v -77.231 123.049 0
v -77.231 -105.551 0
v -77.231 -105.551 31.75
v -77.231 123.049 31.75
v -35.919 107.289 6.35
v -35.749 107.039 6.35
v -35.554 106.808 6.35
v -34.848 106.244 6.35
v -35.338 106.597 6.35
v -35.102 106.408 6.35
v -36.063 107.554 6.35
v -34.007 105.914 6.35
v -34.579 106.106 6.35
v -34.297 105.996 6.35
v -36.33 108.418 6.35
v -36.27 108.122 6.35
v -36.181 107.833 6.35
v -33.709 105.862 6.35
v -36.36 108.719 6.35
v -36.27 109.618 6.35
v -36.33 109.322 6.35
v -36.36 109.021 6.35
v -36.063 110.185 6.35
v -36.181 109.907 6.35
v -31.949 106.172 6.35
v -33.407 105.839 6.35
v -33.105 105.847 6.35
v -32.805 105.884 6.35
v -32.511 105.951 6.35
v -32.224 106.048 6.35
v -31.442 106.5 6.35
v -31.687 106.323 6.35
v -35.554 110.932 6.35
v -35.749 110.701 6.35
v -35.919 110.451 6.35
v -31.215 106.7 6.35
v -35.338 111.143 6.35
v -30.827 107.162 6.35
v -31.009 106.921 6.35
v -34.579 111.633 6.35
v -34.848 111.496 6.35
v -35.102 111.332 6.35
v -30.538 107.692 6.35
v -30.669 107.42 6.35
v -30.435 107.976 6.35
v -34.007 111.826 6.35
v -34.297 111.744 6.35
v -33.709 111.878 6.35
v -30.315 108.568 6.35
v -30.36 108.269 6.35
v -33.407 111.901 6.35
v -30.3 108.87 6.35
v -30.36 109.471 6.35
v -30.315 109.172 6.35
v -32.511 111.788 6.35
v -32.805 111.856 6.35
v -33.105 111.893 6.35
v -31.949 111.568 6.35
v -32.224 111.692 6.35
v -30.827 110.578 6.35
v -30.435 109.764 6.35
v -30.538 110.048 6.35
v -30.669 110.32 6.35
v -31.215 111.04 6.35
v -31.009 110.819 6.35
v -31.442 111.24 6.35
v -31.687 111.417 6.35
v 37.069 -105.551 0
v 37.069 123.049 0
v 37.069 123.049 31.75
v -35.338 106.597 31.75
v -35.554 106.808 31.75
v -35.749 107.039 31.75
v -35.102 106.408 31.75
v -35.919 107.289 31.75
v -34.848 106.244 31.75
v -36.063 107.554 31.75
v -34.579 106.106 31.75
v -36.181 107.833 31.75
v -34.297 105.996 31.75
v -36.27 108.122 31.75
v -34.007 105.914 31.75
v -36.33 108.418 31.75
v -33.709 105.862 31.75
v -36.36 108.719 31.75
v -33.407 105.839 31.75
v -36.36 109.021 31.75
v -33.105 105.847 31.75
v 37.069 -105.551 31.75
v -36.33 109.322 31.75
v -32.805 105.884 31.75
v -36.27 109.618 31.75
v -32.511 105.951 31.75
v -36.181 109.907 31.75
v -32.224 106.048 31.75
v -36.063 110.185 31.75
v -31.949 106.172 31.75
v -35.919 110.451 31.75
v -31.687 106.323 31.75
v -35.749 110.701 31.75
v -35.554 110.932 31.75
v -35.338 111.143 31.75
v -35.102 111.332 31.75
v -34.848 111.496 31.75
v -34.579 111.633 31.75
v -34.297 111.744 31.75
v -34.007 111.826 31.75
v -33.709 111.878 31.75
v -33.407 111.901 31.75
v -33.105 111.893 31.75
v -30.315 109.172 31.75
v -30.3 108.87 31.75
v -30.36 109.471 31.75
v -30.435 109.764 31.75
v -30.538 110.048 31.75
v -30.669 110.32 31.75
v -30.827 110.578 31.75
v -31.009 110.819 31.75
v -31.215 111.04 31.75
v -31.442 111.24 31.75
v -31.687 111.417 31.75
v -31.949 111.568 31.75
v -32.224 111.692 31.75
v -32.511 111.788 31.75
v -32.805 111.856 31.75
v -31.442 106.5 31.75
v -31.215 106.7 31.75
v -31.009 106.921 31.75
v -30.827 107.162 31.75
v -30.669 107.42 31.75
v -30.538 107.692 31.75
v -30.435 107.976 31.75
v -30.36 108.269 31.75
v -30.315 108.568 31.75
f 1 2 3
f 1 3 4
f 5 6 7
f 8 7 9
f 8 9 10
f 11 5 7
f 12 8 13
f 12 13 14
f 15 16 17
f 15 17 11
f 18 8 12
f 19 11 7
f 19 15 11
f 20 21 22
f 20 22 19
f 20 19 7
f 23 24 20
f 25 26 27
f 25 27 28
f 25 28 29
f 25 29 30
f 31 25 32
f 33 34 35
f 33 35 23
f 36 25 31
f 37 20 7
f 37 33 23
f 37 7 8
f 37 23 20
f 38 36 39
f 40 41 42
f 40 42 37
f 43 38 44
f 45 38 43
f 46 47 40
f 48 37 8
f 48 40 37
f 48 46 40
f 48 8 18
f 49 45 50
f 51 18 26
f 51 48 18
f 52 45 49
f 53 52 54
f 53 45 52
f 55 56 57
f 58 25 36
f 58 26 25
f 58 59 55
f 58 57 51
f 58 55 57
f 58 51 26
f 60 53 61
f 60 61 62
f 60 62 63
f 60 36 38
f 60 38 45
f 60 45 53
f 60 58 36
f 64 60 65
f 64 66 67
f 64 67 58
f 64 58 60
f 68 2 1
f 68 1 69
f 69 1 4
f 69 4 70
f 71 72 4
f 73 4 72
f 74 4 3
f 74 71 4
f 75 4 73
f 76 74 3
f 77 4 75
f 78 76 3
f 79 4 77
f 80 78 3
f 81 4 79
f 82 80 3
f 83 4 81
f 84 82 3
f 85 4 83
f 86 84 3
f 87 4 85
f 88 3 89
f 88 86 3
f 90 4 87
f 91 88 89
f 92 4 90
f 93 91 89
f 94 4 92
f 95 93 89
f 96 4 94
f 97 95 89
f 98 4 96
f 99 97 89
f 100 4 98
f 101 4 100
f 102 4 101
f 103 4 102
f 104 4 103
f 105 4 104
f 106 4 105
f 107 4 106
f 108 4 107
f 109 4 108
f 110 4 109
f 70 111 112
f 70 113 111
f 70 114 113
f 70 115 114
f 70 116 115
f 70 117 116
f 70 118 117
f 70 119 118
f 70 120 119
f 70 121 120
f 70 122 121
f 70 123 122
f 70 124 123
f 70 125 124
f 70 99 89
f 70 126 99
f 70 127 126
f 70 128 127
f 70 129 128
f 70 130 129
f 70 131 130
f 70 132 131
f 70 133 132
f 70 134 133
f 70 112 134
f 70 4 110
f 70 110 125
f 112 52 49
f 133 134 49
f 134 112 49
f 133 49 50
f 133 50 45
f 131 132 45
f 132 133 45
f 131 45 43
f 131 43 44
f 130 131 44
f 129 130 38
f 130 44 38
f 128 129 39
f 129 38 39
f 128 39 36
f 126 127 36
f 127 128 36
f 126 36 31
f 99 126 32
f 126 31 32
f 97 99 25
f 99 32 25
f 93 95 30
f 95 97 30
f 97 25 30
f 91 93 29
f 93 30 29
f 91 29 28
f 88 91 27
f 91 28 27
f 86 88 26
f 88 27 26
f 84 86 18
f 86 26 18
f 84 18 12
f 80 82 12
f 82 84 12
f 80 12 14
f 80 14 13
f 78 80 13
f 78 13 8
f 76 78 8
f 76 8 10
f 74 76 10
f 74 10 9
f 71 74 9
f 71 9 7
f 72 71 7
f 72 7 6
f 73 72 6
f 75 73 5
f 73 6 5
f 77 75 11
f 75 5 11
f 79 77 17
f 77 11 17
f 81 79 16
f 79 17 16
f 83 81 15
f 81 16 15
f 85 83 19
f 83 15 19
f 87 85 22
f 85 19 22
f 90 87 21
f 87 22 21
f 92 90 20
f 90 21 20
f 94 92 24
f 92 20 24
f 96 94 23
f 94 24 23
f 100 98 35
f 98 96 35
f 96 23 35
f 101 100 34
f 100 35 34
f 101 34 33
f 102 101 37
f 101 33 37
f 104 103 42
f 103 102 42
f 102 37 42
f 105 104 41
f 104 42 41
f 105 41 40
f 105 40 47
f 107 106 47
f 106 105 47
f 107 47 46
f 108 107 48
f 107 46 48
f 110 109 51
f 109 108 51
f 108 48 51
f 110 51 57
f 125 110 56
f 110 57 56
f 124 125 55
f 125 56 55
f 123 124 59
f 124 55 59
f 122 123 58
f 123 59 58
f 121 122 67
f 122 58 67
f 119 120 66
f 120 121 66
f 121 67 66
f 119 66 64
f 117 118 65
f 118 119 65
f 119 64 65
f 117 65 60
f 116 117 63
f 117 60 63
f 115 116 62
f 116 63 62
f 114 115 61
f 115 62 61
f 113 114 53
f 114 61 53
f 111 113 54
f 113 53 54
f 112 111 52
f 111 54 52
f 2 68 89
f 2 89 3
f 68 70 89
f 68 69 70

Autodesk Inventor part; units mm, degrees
ref_plane "YZ Plane" through (0, 0, 0) normal (1, 0, 0) x (0, 1, 0)
ref_plane "XZ Plane" through (0, 0, 0) normal (0, 1, 0) x (-1, 0, 0)
ref_plane "XY Plane" through (0, 0, 0) normal (0, 0, 1) x (1, 0, 0)
sketch "Sketch1" plane through (0, 0, 0) normal (0, 0, 1) x (1, 0, 0)
  line L0 (37.0694, -105.5511) -> (-77.2306, -105.5511)
  line L1 (-77.2306, -105.5511) -> (-77.2306, 123.0489)
  line L2 (-77.2306, 123.0489) -> (37.0694, 123.0489)
  line L3 (37.0694, 123.0489) -> (37.0694, -105.5511)
  line L4 (37.0694, -105.5511) -> (-77.2306, 123.0489) construction
  line L5 (-77.2306, -105.5511) -> (37.0694, 123.0489) construction
  point P0 (0, 0)
  point P1 (-20.0806, 8.7489)
  dimension "d0" = 114.3
  dimension "d1" = 228.6
extrude "Extrusion1" add sketch "Sketch1" along normal blind 6.35
sketch "Sketch2" plane through (0, 0, 6.35) normal (0, 0, 1) x (1, 0, 0)
  line L0 (-77.2306, -105.5511) -> (37.0694, -105.5511) projected
  line L1 (37.0694, -105.5511) -> (37.0694, 123.0489) projected
  line L2 (37.0694, 123.0489) -> (-77.2306, 123.0489) projected
  line L3 (-77.2306, 123.0489) -> (-77.2306, -105.5511) projected
  circle A0 centre (-33.3319, 108.8699) radius 3.0318
  point P0 (0, 0)
extrude "Extrusion2" add sketch "Sketch2" along normal blind 25.4
properties part number "bottom2 battery holder"
